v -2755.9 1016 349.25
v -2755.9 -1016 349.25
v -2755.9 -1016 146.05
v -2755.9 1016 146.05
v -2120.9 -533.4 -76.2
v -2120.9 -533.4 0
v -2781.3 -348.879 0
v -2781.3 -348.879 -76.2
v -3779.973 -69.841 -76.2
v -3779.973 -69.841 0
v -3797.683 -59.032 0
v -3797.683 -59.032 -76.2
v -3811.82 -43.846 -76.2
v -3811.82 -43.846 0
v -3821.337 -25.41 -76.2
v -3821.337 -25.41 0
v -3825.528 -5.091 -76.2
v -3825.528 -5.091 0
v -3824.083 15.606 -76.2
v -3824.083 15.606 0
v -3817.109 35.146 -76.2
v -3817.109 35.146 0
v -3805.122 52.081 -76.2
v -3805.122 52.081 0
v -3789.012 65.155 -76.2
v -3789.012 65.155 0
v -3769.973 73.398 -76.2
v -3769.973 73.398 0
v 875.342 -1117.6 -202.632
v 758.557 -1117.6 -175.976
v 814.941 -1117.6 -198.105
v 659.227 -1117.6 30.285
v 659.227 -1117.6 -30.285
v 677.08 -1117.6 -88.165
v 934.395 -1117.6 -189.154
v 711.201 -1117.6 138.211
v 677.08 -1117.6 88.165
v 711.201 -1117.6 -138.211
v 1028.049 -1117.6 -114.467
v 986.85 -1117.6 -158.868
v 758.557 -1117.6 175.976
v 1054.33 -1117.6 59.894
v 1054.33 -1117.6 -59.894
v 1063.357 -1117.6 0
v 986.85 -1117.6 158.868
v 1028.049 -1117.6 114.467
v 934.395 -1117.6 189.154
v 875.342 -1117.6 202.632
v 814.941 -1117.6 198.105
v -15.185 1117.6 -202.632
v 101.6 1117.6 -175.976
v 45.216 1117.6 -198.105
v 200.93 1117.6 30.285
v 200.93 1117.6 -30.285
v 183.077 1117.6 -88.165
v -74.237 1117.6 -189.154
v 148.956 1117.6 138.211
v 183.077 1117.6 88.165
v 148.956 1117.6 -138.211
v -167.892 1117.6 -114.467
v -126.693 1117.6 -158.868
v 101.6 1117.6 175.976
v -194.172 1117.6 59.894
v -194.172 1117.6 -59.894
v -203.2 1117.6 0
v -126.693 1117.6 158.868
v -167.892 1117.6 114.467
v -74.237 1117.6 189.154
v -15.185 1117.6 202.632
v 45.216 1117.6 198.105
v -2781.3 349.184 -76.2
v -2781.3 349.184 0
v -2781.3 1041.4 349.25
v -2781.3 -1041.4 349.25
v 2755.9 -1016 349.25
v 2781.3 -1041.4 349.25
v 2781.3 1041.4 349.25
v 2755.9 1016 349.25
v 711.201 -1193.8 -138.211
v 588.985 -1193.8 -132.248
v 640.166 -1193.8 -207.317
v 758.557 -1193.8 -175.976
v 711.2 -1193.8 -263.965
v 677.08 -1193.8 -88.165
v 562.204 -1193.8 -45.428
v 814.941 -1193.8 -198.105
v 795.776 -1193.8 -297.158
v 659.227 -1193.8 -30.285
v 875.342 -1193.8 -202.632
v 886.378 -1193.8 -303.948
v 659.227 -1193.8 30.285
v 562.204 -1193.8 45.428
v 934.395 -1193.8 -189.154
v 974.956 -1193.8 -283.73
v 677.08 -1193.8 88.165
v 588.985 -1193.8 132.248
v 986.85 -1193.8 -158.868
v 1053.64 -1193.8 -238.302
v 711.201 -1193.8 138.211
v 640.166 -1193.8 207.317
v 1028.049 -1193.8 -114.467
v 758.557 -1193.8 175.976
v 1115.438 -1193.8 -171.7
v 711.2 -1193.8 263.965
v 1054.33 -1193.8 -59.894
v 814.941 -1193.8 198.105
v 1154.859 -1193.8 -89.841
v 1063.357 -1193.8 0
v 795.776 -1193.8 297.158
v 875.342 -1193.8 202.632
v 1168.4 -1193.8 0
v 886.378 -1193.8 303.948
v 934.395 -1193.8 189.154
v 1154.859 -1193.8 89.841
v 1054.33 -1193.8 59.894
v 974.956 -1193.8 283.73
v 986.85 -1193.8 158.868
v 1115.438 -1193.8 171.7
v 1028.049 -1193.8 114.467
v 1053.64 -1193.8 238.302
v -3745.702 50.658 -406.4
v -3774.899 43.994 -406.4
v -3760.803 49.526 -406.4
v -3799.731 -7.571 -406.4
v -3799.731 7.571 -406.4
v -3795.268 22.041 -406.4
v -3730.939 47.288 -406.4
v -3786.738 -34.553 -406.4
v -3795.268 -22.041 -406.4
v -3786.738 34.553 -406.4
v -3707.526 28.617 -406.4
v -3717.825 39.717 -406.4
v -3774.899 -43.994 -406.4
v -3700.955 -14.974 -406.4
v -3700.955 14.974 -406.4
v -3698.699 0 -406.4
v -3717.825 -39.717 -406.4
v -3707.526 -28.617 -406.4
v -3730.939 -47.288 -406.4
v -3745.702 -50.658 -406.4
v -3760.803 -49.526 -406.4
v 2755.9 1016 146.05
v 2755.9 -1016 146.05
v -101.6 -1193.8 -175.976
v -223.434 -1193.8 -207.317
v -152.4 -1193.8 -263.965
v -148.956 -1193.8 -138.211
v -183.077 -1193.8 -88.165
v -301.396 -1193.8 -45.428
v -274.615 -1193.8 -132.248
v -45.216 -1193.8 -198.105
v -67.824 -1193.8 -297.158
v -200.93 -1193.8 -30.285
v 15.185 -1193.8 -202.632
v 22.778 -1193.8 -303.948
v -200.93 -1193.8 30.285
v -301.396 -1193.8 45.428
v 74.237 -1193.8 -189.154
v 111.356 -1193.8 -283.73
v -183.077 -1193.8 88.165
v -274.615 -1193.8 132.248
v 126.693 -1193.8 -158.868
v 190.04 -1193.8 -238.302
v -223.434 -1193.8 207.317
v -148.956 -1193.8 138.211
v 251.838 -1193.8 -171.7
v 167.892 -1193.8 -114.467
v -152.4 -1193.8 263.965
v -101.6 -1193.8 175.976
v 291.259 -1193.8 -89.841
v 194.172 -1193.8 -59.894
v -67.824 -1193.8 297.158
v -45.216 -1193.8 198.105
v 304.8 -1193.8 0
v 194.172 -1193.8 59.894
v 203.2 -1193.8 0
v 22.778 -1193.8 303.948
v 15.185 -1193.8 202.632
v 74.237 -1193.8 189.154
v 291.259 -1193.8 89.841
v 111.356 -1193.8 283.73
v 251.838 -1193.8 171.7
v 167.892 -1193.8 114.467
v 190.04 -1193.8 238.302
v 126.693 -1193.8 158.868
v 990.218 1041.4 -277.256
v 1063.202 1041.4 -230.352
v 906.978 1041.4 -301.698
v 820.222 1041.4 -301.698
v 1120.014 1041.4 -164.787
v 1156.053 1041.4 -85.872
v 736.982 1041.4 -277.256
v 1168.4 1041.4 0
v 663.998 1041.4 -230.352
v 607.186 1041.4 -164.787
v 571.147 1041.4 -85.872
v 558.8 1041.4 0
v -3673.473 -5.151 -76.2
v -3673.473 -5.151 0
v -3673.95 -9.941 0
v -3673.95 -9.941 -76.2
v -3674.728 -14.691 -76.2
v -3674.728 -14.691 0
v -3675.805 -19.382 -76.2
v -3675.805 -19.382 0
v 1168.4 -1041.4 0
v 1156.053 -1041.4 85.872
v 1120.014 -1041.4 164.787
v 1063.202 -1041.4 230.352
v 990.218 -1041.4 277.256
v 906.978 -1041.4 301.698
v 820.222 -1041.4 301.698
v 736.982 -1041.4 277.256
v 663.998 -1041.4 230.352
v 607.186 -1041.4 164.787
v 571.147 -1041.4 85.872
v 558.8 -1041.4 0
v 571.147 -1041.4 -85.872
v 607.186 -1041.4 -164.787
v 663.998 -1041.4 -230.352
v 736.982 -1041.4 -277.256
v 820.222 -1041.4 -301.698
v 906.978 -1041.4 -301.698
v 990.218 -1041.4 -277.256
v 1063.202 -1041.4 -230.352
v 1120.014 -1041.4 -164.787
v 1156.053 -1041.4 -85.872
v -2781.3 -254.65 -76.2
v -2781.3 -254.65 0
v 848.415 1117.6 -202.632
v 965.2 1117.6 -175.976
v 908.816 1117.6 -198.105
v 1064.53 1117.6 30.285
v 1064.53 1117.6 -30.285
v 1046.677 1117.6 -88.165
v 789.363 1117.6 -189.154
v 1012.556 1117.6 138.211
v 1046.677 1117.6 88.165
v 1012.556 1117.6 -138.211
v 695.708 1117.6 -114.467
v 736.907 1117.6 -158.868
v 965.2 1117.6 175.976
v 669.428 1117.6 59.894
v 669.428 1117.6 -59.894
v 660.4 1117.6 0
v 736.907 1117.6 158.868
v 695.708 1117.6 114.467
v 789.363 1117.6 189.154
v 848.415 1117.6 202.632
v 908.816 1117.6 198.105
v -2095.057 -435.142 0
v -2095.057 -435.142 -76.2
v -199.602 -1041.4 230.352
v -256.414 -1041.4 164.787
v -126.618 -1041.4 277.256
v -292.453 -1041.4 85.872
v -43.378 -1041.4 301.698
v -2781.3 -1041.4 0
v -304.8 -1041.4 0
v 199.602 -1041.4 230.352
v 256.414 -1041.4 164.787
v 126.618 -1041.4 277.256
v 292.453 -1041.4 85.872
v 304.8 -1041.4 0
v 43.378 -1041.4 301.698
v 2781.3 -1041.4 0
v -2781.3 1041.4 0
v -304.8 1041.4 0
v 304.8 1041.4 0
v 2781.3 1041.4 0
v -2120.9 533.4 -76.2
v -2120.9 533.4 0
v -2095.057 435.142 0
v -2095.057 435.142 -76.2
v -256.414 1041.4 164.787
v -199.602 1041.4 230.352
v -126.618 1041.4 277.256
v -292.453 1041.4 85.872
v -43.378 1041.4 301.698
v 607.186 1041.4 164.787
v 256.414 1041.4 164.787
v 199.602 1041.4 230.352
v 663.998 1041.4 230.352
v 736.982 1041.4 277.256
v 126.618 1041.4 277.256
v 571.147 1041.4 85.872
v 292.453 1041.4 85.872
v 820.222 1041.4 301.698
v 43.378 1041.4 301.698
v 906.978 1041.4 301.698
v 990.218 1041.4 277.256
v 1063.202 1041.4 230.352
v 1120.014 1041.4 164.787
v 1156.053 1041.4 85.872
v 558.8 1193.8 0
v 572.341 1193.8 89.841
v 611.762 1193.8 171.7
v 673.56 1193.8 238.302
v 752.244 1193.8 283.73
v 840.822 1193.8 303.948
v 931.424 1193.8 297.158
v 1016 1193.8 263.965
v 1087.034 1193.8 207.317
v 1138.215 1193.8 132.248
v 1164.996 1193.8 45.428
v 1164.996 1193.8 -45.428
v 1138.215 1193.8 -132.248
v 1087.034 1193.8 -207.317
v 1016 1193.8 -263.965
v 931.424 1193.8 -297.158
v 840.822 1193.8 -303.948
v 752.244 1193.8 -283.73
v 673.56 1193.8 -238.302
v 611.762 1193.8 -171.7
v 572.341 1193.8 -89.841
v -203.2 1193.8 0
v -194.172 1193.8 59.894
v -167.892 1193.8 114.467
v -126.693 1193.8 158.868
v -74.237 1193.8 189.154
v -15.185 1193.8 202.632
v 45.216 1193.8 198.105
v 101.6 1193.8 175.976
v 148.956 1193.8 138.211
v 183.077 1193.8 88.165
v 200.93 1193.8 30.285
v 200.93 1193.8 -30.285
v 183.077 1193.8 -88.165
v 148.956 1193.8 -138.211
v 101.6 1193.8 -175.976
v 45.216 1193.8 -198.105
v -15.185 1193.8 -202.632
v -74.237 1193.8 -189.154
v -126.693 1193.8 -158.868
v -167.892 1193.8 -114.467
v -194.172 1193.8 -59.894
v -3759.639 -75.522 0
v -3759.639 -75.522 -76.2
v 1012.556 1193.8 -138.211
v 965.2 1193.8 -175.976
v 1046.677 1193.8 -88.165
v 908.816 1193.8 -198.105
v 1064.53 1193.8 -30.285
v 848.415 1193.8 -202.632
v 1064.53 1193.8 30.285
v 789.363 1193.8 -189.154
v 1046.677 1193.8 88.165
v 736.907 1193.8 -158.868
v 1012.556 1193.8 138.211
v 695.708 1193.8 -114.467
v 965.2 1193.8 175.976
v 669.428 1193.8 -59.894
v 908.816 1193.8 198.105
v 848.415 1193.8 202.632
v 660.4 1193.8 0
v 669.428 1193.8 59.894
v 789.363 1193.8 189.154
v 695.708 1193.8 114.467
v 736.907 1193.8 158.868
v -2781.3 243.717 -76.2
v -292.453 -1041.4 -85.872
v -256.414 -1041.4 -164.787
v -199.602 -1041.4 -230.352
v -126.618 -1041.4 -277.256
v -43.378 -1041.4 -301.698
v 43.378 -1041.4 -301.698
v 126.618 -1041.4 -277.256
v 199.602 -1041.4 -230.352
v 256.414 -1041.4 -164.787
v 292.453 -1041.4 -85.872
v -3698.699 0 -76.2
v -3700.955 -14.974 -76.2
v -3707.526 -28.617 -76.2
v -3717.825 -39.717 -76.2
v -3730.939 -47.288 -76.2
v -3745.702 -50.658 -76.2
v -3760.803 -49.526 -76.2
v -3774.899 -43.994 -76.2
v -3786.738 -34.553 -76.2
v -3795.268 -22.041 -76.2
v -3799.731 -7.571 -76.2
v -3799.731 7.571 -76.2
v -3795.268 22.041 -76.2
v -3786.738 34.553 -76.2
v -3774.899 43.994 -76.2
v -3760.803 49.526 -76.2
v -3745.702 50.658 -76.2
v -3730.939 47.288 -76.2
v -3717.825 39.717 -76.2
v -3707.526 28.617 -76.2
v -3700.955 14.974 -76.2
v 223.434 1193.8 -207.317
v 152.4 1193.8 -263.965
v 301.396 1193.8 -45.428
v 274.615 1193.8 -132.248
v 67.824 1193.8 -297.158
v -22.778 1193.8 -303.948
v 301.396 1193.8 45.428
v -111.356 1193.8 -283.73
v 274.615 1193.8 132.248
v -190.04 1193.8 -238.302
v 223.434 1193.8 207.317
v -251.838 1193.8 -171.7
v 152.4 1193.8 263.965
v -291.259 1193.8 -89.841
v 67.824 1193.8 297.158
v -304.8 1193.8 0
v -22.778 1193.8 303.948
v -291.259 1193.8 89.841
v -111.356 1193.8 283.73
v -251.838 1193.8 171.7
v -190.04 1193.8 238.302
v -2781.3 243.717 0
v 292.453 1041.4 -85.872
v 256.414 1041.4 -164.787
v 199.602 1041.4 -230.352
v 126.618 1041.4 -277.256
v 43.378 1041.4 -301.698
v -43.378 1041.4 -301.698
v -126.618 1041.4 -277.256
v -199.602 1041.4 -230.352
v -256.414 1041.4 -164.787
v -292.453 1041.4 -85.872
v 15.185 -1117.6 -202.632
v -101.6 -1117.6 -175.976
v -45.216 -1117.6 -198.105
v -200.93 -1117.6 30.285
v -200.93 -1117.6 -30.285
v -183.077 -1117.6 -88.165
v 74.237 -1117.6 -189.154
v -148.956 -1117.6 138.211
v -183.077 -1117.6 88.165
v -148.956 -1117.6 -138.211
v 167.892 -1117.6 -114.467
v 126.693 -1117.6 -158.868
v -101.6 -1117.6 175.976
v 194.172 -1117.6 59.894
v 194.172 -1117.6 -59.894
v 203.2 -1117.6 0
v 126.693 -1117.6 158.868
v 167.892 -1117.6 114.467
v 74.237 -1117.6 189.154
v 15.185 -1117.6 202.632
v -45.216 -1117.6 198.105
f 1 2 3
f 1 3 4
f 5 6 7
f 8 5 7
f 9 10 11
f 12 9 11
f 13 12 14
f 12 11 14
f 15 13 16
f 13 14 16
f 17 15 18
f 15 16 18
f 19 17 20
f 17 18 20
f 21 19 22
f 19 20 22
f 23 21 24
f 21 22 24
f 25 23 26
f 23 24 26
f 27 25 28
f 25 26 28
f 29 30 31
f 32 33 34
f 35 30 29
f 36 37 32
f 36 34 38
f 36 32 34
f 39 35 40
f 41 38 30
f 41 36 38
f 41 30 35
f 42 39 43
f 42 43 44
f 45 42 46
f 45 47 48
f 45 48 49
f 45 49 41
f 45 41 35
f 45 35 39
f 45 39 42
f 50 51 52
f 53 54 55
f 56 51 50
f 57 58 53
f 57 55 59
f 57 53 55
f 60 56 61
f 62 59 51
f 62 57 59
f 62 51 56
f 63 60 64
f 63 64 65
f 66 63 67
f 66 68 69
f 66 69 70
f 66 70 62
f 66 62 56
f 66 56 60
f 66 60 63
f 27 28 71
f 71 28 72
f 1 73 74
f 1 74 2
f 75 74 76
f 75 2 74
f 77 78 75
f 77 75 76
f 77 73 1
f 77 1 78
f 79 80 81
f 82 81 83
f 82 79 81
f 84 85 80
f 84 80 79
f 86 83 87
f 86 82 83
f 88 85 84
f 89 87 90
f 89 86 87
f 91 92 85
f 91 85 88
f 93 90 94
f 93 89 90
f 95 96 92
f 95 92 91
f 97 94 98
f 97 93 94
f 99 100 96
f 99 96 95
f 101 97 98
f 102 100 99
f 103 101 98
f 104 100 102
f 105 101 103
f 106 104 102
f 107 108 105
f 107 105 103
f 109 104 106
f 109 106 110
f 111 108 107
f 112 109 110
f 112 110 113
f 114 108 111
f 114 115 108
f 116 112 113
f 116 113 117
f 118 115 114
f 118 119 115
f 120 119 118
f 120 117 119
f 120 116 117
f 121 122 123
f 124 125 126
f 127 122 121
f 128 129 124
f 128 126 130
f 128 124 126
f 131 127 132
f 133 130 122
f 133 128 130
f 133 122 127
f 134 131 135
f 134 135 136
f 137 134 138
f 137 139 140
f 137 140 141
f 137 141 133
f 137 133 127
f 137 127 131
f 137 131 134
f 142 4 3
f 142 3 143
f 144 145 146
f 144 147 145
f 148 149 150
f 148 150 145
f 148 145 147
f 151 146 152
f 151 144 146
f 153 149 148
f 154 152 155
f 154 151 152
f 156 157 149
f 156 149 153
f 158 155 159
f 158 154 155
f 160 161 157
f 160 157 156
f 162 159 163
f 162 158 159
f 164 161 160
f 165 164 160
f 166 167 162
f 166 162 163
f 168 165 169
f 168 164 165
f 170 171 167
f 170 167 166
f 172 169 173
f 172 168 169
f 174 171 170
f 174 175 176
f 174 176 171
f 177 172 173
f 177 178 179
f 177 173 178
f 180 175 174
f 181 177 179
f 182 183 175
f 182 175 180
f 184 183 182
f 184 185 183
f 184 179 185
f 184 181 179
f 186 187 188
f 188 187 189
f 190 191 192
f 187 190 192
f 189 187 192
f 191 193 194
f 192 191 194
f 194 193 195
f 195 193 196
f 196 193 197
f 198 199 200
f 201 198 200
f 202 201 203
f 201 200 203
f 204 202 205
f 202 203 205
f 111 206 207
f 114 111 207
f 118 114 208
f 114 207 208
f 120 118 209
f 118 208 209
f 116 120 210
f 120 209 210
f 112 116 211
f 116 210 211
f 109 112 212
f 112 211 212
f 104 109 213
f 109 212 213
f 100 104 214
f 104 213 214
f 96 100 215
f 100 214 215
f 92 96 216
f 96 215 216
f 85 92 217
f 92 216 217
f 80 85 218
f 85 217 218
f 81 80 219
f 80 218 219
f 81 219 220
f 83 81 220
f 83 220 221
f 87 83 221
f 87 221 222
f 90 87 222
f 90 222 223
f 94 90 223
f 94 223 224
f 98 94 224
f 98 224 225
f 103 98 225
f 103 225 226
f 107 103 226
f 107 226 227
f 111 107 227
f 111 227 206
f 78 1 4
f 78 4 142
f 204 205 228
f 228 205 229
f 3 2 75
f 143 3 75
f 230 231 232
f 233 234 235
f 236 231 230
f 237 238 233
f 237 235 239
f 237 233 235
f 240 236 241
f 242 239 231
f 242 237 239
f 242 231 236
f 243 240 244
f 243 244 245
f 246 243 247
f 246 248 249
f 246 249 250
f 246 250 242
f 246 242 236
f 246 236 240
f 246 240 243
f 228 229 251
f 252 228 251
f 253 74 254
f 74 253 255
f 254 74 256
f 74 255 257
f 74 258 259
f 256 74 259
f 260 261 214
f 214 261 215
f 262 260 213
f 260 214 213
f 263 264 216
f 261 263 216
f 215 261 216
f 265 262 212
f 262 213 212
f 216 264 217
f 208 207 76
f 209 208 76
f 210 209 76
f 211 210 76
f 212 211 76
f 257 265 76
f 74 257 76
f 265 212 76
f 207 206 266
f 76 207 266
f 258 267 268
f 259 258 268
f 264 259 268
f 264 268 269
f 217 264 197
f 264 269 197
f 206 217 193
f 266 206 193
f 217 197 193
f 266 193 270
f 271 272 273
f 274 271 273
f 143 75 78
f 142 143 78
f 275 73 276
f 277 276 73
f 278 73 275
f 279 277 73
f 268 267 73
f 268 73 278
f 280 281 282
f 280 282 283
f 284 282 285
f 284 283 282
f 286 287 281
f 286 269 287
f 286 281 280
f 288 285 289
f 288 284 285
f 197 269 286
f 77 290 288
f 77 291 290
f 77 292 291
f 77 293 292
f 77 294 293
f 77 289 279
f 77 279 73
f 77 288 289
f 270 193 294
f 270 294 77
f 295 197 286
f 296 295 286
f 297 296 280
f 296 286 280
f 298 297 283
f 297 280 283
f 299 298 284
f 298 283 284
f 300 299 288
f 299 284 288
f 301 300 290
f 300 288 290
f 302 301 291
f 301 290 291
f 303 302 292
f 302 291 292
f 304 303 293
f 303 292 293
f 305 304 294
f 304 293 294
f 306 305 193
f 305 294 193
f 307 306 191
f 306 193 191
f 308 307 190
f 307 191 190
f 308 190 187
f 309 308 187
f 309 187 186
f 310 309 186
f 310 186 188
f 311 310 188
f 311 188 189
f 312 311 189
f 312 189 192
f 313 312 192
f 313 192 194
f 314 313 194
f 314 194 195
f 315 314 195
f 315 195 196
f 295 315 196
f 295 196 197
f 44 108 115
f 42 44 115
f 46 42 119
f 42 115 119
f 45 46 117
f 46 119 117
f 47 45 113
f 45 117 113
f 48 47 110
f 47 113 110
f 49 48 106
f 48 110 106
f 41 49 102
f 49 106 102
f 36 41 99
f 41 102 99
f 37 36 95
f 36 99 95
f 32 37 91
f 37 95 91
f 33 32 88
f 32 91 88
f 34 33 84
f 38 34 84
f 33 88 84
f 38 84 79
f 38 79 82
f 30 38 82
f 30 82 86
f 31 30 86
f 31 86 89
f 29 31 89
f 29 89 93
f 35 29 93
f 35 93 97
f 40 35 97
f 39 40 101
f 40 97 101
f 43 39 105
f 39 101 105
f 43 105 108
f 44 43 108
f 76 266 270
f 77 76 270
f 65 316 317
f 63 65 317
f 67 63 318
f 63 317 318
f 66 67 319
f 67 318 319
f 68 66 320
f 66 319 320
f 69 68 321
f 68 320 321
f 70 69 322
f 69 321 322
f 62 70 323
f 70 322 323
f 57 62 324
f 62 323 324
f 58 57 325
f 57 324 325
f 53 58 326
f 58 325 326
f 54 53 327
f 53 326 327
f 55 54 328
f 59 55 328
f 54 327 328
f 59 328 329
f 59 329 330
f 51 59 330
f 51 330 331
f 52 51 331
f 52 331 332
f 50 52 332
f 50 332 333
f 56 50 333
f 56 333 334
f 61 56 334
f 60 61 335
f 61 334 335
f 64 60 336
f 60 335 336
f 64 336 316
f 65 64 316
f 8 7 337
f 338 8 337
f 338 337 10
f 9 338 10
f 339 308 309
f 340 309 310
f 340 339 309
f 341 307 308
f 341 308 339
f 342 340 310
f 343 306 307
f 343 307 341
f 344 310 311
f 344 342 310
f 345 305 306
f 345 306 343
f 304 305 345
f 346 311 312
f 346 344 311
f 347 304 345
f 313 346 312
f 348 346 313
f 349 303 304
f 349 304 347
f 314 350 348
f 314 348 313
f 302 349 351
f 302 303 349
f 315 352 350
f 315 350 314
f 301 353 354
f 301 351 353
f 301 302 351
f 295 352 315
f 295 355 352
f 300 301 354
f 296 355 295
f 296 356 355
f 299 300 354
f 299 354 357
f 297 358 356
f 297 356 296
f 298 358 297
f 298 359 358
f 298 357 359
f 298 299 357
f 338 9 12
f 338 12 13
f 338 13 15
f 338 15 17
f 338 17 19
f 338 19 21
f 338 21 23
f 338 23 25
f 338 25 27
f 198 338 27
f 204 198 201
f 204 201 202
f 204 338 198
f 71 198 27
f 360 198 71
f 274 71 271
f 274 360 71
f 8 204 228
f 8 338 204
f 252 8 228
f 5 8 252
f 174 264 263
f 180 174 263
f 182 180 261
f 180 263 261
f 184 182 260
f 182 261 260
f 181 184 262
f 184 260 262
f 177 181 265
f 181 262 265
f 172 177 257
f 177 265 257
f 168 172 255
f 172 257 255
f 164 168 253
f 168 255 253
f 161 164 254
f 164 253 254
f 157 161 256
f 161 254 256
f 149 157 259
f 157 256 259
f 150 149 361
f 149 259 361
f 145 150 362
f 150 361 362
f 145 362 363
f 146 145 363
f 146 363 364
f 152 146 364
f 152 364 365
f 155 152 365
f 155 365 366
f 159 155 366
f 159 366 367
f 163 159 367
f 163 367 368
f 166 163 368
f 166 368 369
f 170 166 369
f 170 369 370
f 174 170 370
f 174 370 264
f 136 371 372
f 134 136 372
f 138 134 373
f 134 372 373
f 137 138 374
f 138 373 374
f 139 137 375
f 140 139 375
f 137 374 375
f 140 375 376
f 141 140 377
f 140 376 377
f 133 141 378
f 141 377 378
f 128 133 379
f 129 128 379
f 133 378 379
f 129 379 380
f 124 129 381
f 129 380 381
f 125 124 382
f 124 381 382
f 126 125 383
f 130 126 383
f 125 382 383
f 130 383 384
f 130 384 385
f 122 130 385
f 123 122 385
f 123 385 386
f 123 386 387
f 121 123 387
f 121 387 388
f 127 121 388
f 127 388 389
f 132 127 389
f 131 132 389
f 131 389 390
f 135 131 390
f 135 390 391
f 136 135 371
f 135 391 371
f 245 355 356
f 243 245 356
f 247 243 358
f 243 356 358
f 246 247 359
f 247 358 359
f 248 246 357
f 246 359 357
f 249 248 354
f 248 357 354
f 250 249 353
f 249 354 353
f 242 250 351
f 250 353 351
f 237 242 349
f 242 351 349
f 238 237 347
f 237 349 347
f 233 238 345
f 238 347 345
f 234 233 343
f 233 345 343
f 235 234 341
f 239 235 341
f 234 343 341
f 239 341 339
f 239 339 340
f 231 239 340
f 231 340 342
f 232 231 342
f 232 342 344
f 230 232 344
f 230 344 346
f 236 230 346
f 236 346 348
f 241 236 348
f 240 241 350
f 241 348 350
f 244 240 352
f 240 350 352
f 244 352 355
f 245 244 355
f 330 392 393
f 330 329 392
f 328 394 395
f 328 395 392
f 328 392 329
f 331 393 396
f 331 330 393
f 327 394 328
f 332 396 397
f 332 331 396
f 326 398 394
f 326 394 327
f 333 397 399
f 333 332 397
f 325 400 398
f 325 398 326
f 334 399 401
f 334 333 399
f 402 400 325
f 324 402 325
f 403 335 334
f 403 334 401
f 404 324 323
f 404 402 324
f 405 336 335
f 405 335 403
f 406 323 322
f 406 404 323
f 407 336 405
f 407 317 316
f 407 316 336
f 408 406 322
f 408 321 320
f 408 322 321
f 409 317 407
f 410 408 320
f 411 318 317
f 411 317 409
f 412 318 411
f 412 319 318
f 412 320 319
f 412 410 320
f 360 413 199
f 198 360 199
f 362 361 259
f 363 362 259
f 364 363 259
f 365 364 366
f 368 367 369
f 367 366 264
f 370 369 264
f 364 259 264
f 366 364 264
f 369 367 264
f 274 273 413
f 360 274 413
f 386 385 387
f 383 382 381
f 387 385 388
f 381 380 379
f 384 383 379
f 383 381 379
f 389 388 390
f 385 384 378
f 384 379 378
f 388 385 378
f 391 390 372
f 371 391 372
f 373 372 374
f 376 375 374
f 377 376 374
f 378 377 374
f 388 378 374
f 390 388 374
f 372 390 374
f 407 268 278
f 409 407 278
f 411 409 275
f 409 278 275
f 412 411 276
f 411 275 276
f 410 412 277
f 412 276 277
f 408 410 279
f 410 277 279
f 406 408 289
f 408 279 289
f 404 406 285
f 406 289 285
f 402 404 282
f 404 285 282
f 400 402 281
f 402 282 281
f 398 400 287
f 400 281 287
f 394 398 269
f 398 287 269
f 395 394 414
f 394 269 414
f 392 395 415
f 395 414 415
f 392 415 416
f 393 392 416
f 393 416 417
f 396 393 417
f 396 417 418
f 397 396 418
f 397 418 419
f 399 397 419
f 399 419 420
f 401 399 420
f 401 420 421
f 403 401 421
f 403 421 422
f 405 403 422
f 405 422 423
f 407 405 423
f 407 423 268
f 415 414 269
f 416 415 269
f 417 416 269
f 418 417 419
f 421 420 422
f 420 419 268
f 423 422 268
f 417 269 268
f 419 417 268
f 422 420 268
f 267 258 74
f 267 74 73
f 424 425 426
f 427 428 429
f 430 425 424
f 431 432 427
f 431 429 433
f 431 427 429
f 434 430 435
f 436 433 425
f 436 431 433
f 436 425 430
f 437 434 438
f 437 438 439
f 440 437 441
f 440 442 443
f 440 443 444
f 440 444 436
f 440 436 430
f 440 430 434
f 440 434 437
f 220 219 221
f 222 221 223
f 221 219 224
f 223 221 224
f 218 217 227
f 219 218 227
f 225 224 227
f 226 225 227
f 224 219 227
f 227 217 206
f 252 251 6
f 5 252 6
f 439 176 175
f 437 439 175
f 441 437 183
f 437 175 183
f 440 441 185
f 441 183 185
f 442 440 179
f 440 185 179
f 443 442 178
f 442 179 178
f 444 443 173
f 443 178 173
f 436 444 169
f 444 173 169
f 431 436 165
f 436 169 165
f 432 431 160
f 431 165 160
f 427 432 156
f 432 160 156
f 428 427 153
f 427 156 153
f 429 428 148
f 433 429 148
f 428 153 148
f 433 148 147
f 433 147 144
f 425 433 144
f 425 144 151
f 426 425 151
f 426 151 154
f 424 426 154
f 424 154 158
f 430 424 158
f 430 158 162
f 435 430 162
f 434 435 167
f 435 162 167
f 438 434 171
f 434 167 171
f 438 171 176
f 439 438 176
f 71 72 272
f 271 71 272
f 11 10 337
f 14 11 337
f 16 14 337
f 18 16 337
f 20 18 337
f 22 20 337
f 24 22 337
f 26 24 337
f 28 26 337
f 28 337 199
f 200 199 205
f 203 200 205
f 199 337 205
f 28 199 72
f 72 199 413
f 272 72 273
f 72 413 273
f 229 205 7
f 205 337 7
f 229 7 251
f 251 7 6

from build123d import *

# Parameters (mm, degrees)
F0_W      = 5562.6
F0_H      = 2082.8
F1_DEPTH  = 349.25
F2_W      = 5511.8
F2_H      = 2032
F3_DEPTH  = 203.2
F5_DEPTH  = 152.4
F6_R      = 203.2
F7_DEPTH  = 76.2
F9_DEPTH  = 152.4
F10_R     = 203.2
F11_DEPTH = 76.2
F13_DEPTH = 76.2
F14_R     = 50.8
F15_DEPTH = 330.2


with BuildPart() as f1:
    # F0 (on Top) → F1 (new body)
    with BuildSketch(Plane.XY):
        Rectangle(F0_W, F0_H)
    extrude(amount=F1_DEPTH)

    # F2 (on face) → F3 (cut)
    with BuildSketch(Plane.XY.offset(349.25)):
        Rectangle(F2_W, F2_H)
    extrude(amount=-F3_DEPTH, mode=Mode.SUBTRACT)

    # F4 (on face) → F5 (join)
    with BuildSketch(Plane.XZ.offset(1041.4)):
        with BuildLine():
            ThreePointArc((-304.8, 0), (0, -304.8), (304.8, 0))
            Line((304.8, 0), (-304.8, 0))
        make_face()
        with BuildLine():
            Line((-304.8, 0), (304.8, 0))
            ThreePointArc((304.8, 0), (0, 304.8), (-304.8, 0))
        make_face()
        with BuildLine():
            Line((1168.4, 0), (558.8, 0))
            ThreePointArc((558.8, 0), (863.6, -304.8), (1168.4, 0))
        make_face()
        with BuildLine():
            ThreePointArc((1168.4, 0), (863.6, 304.8), (558.8, 0))
            Line((558.8, 0), (1168.4, 0))
        make_face()
    extrude(amount=F5_DEPTH)

    # F6 (on face) → F7 (cut)
    with BuildSketch(Plane.XZ.offset(1193.8)):
        Circle(F6_R)
        with Locations((860.157311, 0)):
            Circle(F6_R)
    extrude(amount=-F7_DEPTH, mode=Mode.SUBTRACT)

    # F8 (on face) → F9 (join)
    with BuildSketch(Plane(origin=(0, 1041.4, 0), x_dir=(-1, 0, 0), z_dir=(0, 1, 0))):
        with BuildLine():
            ThreePointArc((-1168.4, 0), (-863.6, -304.8), (-558.8, 0))
            Line((-558.8, 0), (-1168.4, 0))
        make_face()
        with BuildLine():
            Line((-1168.4, 0), (-558.8, 0))
            ThreePointArc((-558.8, 0), (-863.6, 304.8), (-1168.4, 0))
        make_face()
        with BuildLine():
            ThreePointArc((-304.8, 0), (0, -304.8), (304.8, 0))
            Line((304.8, 0), (-304.8, 0))
        make_face()
        with BuildLine():
            Line((-304.8, 0), (304.8, 0))
            ThreePointArc((304.8, 0), (0, 304.8), (-304.8, 0))
        make_face()
    extrude(amount=F9_DEPTH)

    # F10 (on face) → F11 (cut)
    with BuildSketch(Plane(origin=(0, 1193.8, 0), x_dir=(-1, 0, 0), z_dir=(0, 1, 0))):
        with Locations((-863.6, 0)):
            Circle(F10_R)
        Circle(F10_R)
    extrude(amount=-F11_DEPTH, mode=Mode.SUBTRACT)


with BuildPart() as f13:
    # F12 (on face) → F13 (new body)
    with BuildSketch(Plane(origin=(0, 0, 0), x_dir=(1, 0, 0), z_dir=(0, 0, -1))):
        with BuildLine():
            Line((-2781.3, 348.878597), (-3759.639471, 75.522188))
            Line((-3759.639471, 75.522188), (-3779.973202, 69.84077))
            ThreePointArc((-3779.973202, 69.84077), (-3825.513466, -5.307215), (-3769.972559, -73.397911))
            Line((-3769.972559, -73.397911), (-2781.3, -349.184104))
            Line((-2781.3, -349.184104), (-2781.3, -243.716969))
            Line((-2781.3, -243.716969), (-3673.47281, 5.151011))
            ThreePointArc((-3673.47281, 5.151011), (-3674.301387, 12.322042), (-3675.804825, 19.382488))
            Line((-3675.804825, 19.382488), (-2781.3, 254.649992))
            Line((-2781.3, 254.649992), (-2781.3, 348.878597))
        make_face()
        Polygon((-2120.9, 533.4), (-2781.3, 348.878597), (-2781.3, 254.649992), (-2095.056682, 435.141754), align=None)
        Polygon((-2781.3, -243.716969), (-2781.3, -349.184104), (-2120.9, -533.4), (-2095.056682, -435.141754), align=None)
    extrude(amount=F13_DEPTH)


with BuildPart() as f15:
    # F14 (on face) → F15 (new body)
    with BuildSketch(Plane(origin=(0, 0, -76.2), x_dir=(1, 0, 0), z_dir=(0, 0, -1))):
        with Locations((-3749.49851, 0)):
            Circle(F14_R)
    extrude(amount=F15_DEPTH)


solid = Compound([f1.part, f13.part, f15.part])
